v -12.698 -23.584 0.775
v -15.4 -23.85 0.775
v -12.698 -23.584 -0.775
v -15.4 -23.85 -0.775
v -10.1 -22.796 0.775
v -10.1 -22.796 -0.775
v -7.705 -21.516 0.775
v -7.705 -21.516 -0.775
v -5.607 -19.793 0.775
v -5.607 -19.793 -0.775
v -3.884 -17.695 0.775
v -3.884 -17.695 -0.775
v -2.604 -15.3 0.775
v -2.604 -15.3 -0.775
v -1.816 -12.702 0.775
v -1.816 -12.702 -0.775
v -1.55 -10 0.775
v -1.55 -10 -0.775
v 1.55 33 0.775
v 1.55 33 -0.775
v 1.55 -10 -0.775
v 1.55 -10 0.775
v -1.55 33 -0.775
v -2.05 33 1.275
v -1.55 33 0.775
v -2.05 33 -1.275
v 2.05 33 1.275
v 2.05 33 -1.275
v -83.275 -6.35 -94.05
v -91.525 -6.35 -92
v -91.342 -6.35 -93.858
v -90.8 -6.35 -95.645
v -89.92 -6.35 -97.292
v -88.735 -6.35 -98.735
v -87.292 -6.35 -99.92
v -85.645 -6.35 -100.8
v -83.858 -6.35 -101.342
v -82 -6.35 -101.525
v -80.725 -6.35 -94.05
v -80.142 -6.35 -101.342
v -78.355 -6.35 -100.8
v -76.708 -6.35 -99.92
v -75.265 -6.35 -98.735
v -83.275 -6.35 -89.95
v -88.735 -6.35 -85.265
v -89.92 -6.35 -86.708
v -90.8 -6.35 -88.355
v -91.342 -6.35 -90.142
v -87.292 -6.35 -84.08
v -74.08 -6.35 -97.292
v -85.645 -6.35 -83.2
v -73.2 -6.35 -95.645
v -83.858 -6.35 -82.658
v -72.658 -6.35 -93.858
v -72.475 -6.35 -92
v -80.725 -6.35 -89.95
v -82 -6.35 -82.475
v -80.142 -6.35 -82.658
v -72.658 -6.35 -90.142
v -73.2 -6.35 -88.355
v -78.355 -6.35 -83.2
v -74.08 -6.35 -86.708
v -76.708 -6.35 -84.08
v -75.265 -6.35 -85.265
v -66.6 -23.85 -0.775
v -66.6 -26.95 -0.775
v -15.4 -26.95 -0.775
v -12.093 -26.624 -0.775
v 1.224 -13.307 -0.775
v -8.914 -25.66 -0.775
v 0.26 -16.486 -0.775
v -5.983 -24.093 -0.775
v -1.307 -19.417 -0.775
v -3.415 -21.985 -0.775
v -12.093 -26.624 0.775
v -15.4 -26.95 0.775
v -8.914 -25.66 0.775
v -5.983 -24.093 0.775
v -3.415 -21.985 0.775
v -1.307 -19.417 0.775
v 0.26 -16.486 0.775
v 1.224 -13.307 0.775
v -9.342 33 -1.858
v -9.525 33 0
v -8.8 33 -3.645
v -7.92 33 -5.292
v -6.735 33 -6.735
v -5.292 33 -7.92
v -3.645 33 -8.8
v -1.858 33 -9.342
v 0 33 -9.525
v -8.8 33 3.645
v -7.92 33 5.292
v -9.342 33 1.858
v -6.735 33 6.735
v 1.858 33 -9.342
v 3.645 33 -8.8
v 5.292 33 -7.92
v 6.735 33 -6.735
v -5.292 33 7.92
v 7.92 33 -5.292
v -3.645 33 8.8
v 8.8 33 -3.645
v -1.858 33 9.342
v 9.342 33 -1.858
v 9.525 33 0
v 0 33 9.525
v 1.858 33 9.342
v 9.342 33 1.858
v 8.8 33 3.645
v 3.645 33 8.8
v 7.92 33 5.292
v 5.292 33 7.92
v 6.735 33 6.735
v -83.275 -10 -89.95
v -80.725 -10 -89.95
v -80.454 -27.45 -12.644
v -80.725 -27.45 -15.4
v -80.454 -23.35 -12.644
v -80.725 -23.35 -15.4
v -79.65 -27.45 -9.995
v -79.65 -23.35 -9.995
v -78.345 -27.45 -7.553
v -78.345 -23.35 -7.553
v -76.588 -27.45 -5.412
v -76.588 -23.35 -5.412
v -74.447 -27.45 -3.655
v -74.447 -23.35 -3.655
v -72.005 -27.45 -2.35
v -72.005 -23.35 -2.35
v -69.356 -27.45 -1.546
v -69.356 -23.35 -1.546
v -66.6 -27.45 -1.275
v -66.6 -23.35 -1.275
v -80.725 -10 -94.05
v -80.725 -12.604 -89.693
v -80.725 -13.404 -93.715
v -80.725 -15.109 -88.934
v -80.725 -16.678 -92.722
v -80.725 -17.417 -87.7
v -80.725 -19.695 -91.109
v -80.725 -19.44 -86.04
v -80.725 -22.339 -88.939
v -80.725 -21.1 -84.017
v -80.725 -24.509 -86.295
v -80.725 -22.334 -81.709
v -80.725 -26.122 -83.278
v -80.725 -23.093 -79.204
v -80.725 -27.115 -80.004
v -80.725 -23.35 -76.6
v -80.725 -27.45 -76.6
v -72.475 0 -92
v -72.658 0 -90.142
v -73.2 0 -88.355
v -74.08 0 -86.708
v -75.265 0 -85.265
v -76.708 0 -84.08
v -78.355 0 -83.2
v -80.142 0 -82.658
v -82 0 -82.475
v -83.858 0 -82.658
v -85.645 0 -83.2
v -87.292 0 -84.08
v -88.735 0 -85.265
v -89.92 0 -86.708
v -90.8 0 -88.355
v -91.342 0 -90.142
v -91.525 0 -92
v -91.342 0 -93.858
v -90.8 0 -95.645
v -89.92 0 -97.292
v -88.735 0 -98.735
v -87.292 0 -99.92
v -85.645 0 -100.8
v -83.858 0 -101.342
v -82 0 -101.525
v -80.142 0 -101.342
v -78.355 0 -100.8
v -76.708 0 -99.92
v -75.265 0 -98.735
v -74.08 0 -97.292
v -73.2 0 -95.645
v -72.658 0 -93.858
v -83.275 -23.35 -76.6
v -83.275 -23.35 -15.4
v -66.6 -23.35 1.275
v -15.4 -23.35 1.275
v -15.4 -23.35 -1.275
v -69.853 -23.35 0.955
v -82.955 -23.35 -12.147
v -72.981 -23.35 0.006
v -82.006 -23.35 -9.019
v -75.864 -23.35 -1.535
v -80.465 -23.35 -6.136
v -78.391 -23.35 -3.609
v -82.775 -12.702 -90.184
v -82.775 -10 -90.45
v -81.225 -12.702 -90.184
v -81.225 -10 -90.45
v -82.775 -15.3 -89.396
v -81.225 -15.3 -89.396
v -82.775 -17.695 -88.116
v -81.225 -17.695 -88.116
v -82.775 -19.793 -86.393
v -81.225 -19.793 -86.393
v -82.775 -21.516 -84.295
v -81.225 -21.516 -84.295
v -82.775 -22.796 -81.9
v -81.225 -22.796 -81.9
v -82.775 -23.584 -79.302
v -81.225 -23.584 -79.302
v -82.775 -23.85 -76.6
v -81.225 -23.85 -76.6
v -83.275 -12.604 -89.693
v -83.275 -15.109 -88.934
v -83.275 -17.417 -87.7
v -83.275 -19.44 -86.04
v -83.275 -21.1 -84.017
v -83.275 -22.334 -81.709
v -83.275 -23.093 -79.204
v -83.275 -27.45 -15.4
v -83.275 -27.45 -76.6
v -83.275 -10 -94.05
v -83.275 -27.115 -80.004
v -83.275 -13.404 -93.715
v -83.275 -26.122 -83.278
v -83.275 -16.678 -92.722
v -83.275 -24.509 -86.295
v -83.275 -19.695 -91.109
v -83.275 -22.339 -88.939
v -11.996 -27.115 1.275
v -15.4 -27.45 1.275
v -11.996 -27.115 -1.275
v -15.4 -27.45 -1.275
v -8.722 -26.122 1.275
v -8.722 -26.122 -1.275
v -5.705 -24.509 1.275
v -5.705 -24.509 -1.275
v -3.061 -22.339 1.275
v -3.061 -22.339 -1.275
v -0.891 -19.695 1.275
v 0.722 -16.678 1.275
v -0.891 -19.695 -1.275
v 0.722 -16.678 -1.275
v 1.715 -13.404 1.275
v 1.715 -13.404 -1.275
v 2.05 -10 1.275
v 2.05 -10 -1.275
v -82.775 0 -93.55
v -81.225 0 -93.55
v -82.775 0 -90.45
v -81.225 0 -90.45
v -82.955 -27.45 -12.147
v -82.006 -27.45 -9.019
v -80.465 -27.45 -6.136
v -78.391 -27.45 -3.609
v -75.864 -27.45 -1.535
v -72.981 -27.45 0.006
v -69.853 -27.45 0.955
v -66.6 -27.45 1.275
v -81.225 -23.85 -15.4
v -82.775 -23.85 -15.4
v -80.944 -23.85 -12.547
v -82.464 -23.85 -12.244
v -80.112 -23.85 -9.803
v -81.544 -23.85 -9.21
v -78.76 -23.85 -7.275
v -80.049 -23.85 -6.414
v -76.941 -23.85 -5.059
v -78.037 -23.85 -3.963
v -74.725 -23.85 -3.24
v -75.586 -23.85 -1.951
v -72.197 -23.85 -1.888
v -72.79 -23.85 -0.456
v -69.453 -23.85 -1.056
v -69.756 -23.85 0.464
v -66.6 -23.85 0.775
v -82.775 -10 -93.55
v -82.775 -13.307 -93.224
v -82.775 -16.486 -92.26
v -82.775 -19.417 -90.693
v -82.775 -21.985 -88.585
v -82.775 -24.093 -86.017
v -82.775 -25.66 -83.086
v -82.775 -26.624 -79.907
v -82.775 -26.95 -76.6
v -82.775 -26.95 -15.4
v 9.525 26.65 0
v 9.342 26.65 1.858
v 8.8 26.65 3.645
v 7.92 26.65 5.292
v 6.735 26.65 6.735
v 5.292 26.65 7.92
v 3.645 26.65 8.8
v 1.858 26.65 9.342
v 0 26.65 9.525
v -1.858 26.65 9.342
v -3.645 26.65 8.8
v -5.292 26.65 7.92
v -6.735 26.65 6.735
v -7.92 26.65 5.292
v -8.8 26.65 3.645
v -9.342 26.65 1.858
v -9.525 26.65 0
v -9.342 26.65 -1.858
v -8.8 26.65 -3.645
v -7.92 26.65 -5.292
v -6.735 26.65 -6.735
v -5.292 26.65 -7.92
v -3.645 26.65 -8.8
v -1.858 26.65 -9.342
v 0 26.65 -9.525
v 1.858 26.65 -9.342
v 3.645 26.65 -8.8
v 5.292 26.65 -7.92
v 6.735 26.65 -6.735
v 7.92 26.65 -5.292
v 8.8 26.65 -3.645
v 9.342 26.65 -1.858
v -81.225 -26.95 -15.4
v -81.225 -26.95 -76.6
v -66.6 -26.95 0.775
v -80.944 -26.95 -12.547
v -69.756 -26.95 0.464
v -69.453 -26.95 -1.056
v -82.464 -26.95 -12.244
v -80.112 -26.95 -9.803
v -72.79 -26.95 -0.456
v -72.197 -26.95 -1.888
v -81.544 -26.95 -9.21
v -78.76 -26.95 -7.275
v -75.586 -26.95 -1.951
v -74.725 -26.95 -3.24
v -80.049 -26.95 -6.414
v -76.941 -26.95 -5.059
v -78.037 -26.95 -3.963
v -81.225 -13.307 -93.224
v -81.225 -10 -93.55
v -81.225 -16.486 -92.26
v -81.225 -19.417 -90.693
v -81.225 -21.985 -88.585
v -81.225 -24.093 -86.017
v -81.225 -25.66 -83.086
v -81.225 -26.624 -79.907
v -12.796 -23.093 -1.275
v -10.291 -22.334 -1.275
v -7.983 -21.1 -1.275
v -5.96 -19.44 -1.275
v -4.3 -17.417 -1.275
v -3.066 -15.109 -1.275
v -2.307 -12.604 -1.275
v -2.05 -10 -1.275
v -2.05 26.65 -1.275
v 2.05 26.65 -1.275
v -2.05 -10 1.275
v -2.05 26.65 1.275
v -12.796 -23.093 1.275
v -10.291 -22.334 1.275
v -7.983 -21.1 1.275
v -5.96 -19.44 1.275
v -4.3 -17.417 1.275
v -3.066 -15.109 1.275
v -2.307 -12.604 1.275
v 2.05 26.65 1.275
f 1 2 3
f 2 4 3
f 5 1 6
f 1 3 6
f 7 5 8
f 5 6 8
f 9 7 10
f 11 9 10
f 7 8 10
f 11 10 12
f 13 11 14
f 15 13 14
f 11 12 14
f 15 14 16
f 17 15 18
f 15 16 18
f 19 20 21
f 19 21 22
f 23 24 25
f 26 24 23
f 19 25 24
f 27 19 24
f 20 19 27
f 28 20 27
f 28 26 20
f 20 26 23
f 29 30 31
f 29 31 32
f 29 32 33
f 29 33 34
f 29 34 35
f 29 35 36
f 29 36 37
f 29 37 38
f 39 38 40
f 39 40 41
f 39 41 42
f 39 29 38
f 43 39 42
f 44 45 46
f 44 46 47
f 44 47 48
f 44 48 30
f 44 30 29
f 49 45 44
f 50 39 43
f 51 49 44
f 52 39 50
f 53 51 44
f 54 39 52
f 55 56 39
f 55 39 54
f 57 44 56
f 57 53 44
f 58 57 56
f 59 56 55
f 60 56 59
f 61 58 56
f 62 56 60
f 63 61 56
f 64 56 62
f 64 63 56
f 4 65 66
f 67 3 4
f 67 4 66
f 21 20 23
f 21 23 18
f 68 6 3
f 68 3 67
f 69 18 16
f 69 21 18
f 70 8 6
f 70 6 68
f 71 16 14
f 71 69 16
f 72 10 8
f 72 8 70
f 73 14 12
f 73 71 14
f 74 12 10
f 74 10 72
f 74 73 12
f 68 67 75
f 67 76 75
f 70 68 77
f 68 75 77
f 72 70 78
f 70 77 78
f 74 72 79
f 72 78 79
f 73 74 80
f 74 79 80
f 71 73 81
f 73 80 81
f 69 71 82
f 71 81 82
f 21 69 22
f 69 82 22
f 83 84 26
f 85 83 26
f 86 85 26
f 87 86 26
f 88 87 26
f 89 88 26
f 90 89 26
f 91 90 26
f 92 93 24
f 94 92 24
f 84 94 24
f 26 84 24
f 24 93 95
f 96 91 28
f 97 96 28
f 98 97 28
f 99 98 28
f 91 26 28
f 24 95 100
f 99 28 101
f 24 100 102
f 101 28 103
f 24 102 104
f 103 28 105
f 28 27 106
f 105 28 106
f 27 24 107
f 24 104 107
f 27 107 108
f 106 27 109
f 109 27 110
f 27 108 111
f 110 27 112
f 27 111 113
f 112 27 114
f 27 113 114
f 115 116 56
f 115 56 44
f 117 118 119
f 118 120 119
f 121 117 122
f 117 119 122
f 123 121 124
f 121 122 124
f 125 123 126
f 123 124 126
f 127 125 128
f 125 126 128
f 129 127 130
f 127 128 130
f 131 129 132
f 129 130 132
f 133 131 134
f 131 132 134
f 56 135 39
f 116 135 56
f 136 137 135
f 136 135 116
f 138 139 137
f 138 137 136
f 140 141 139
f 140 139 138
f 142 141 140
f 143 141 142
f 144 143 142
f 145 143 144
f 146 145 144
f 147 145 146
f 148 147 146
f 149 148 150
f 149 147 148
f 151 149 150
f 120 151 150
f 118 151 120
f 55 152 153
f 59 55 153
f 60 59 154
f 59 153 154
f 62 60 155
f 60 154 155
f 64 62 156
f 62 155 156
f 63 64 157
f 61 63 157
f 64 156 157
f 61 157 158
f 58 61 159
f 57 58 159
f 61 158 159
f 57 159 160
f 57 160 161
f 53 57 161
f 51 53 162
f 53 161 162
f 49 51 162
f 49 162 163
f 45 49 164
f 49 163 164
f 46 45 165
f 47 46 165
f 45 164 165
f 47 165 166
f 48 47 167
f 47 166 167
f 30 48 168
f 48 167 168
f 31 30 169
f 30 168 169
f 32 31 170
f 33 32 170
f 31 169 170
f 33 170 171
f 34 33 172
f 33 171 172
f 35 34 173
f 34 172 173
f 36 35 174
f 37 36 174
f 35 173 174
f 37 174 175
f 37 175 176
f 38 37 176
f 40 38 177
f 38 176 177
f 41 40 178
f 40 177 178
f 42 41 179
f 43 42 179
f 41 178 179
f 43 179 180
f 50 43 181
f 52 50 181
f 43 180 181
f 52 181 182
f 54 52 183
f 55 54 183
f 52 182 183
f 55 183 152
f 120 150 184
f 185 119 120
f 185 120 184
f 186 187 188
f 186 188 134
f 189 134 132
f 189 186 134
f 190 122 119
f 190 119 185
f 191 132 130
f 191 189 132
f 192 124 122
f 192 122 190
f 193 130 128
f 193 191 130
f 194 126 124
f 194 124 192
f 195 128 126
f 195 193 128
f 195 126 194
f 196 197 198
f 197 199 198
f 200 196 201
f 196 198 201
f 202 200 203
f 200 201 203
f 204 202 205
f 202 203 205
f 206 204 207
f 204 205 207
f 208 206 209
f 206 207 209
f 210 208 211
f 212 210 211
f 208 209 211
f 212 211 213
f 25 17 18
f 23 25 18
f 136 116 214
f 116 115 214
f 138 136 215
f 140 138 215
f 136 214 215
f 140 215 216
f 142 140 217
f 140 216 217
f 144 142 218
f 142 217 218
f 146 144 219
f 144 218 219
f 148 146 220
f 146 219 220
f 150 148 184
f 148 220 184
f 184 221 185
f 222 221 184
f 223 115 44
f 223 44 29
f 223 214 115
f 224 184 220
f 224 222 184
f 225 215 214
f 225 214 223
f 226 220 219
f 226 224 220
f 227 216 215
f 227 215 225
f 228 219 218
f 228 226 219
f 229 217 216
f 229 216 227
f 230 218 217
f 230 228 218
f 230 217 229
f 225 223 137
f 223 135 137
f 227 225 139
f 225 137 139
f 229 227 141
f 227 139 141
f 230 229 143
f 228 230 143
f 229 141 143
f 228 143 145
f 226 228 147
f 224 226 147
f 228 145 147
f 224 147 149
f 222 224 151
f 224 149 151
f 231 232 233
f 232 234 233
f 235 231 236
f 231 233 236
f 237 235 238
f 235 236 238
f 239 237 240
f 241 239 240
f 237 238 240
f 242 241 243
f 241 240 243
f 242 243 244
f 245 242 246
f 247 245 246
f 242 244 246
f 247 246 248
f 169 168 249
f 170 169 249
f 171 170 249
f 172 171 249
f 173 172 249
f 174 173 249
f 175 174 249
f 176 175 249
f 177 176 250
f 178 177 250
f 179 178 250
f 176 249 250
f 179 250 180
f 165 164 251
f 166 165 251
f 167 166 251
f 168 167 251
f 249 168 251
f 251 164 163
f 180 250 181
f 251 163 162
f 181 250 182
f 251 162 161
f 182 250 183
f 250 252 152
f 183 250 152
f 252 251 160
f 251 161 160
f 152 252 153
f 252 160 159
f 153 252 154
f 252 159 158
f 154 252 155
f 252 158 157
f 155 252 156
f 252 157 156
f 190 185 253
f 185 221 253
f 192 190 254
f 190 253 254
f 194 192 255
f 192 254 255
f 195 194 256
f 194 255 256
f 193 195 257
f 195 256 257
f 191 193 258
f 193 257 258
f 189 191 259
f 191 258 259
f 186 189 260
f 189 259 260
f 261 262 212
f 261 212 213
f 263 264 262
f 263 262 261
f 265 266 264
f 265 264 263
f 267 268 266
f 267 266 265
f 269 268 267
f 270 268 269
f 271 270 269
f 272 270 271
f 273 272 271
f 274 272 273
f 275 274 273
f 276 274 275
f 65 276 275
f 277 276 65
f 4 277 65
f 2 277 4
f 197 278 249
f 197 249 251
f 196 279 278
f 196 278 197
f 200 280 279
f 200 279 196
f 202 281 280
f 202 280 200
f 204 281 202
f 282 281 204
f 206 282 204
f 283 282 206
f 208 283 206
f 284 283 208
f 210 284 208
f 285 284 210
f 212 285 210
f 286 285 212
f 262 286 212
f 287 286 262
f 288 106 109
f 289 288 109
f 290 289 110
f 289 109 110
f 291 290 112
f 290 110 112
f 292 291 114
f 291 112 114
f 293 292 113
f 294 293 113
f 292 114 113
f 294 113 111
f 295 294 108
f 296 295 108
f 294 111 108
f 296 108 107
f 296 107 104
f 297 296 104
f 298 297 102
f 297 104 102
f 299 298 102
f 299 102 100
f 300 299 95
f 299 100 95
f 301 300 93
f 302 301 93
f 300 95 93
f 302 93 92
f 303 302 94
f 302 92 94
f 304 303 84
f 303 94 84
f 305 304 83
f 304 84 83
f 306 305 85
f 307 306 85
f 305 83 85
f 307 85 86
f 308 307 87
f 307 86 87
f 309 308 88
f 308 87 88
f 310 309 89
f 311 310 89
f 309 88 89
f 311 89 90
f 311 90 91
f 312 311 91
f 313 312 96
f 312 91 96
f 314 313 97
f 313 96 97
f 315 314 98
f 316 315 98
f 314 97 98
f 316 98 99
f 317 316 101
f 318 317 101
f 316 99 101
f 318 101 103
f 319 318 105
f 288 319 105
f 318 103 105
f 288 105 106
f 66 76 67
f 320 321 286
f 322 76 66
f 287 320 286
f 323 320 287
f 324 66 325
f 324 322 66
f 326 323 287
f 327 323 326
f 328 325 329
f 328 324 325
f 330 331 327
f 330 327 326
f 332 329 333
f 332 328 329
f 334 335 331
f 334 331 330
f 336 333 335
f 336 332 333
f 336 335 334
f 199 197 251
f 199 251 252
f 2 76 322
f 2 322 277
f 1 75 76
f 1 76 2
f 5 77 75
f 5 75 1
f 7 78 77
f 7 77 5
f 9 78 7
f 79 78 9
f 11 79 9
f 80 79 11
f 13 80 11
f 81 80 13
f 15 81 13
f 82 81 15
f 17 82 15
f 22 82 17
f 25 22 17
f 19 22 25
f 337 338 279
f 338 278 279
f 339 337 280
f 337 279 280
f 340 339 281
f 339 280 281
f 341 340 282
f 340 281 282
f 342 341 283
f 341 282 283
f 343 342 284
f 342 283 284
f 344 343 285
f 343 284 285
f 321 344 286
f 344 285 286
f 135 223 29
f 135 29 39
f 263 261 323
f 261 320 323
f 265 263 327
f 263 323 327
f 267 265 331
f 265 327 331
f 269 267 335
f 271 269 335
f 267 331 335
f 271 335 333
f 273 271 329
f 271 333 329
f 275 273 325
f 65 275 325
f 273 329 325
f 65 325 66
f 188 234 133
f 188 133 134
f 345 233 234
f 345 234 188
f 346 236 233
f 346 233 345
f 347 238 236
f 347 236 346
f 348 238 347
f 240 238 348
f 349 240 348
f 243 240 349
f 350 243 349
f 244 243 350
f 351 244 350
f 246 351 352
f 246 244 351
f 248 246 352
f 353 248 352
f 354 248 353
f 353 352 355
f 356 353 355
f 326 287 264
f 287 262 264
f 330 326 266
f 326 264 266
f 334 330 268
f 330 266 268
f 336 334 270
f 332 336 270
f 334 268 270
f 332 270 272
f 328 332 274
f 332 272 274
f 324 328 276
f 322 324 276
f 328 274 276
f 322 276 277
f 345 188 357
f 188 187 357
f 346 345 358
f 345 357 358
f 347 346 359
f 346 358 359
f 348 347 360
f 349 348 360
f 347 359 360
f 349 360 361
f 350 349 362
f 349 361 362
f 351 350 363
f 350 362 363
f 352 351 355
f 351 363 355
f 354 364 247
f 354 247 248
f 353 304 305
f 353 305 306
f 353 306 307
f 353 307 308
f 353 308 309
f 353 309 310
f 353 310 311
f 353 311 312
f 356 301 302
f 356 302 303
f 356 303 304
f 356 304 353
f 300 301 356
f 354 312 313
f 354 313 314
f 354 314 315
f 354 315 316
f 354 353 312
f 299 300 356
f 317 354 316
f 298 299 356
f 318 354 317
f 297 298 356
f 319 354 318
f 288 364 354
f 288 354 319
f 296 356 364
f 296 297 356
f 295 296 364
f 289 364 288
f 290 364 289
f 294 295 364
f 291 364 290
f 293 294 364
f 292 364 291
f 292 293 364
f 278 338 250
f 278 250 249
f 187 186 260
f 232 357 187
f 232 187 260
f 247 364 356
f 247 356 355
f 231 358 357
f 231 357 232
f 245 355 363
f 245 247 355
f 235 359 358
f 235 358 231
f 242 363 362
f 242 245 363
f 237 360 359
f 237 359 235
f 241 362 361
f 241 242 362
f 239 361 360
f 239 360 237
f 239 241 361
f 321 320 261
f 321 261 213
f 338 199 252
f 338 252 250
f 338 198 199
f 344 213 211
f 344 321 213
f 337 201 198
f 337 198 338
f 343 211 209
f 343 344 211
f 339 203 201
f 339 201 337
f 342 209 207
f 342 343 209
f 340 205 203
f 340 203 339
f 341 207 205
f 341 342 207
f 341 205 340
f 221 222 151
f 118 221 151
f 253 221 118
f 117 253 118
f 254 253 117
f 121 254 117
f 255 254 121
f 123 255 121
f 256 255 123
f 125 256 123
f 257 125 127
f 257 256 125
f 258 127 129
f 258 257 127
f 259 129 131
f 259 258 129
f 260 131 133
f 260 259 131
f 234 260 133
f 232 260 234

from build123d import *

# Parameters (mm, degrees)
F7_W      = 2.55
F7_H      = 4.1
F7_W_2    = 1.55
F7_H_2    = 3.1
F6_R      = 9.525
F6_W      = 4.1
F6_H      = 2.55
F9_DEPTH  = 6.35
F7_R      = 9.525
F10_DEPTH = 6.35


with BuildPart() as f8:
    # F8: sweep along a path in F4, F2, F0
    with BuildLine(Plane.YZ.offset(-82)) as f8_path:
        Line((0, -92), (-10, -92))
        ThreePointArc((-10, -92), (-20.8894444303, -87.4894444303), (-25.4, -76.6))
        Line((-25.4, -76.6), (-25.4, -66.6))
    with BuildLine(Plane.XZ.offset(25.4)) as f8_path_2:
        Line((-82, -66.6), (-82, -25.4))
        Line((-82, -25.4), (-82, -15.4))
        ThreePointArc((-82, -15.4), (-77.4894444303, -4.5105555697), (-66.6, 0))
        Line((-66.6, 0), (-56.6, 0))
    with BuildLine(Plane.XY) as f8_path_3:
        Line((-56.6, -25.4), (-25.4, -25.4))
        Line((-25.4, -25.4), (-15.4, -25.4))
        ThreePointArc((-15.4, -25.4), (-4.5105555697, -20.8894444303), (0, -10))
        Line((0, -10), (0, 0))
        Line((0, 0), (0, 33))
    # F7 (on Front) → F8 (sweep)
    with BuildSketch(Plane.XZ):
        with Locations((-82, -92)):
            Rectangle(F7_W, F7_H)
        with Locations((-82, -92)):
            Rectangle(F7_W_2, F7_H_2, mode=Mode.SUBTRACT)
    sweep(path=f8_path.line + f8_path_2.line + f8_path_3.line)

    # F6 (on offset) → F9 (join)
    with BuildSketch(Plane.XZ.offset(-33)):
        Circle(F6_R)
        Rectangle(F6_W, F6_H, mode=Mode.SUBTRACT)
    extrude(amount=F9_DEPTH)

    # F7 (on Front) → F10 (join)
    with BuildSketch(Plane.XZ):
        with Locations((-82, -92)):
            Circle(F7_R)
        with Locations((-82, -92)):
            Rectangle(F7_W, F7_H, mode=Mode.SUBTRACT)
    extrude(amount=F10_DEPTH)


solid = f8.part
